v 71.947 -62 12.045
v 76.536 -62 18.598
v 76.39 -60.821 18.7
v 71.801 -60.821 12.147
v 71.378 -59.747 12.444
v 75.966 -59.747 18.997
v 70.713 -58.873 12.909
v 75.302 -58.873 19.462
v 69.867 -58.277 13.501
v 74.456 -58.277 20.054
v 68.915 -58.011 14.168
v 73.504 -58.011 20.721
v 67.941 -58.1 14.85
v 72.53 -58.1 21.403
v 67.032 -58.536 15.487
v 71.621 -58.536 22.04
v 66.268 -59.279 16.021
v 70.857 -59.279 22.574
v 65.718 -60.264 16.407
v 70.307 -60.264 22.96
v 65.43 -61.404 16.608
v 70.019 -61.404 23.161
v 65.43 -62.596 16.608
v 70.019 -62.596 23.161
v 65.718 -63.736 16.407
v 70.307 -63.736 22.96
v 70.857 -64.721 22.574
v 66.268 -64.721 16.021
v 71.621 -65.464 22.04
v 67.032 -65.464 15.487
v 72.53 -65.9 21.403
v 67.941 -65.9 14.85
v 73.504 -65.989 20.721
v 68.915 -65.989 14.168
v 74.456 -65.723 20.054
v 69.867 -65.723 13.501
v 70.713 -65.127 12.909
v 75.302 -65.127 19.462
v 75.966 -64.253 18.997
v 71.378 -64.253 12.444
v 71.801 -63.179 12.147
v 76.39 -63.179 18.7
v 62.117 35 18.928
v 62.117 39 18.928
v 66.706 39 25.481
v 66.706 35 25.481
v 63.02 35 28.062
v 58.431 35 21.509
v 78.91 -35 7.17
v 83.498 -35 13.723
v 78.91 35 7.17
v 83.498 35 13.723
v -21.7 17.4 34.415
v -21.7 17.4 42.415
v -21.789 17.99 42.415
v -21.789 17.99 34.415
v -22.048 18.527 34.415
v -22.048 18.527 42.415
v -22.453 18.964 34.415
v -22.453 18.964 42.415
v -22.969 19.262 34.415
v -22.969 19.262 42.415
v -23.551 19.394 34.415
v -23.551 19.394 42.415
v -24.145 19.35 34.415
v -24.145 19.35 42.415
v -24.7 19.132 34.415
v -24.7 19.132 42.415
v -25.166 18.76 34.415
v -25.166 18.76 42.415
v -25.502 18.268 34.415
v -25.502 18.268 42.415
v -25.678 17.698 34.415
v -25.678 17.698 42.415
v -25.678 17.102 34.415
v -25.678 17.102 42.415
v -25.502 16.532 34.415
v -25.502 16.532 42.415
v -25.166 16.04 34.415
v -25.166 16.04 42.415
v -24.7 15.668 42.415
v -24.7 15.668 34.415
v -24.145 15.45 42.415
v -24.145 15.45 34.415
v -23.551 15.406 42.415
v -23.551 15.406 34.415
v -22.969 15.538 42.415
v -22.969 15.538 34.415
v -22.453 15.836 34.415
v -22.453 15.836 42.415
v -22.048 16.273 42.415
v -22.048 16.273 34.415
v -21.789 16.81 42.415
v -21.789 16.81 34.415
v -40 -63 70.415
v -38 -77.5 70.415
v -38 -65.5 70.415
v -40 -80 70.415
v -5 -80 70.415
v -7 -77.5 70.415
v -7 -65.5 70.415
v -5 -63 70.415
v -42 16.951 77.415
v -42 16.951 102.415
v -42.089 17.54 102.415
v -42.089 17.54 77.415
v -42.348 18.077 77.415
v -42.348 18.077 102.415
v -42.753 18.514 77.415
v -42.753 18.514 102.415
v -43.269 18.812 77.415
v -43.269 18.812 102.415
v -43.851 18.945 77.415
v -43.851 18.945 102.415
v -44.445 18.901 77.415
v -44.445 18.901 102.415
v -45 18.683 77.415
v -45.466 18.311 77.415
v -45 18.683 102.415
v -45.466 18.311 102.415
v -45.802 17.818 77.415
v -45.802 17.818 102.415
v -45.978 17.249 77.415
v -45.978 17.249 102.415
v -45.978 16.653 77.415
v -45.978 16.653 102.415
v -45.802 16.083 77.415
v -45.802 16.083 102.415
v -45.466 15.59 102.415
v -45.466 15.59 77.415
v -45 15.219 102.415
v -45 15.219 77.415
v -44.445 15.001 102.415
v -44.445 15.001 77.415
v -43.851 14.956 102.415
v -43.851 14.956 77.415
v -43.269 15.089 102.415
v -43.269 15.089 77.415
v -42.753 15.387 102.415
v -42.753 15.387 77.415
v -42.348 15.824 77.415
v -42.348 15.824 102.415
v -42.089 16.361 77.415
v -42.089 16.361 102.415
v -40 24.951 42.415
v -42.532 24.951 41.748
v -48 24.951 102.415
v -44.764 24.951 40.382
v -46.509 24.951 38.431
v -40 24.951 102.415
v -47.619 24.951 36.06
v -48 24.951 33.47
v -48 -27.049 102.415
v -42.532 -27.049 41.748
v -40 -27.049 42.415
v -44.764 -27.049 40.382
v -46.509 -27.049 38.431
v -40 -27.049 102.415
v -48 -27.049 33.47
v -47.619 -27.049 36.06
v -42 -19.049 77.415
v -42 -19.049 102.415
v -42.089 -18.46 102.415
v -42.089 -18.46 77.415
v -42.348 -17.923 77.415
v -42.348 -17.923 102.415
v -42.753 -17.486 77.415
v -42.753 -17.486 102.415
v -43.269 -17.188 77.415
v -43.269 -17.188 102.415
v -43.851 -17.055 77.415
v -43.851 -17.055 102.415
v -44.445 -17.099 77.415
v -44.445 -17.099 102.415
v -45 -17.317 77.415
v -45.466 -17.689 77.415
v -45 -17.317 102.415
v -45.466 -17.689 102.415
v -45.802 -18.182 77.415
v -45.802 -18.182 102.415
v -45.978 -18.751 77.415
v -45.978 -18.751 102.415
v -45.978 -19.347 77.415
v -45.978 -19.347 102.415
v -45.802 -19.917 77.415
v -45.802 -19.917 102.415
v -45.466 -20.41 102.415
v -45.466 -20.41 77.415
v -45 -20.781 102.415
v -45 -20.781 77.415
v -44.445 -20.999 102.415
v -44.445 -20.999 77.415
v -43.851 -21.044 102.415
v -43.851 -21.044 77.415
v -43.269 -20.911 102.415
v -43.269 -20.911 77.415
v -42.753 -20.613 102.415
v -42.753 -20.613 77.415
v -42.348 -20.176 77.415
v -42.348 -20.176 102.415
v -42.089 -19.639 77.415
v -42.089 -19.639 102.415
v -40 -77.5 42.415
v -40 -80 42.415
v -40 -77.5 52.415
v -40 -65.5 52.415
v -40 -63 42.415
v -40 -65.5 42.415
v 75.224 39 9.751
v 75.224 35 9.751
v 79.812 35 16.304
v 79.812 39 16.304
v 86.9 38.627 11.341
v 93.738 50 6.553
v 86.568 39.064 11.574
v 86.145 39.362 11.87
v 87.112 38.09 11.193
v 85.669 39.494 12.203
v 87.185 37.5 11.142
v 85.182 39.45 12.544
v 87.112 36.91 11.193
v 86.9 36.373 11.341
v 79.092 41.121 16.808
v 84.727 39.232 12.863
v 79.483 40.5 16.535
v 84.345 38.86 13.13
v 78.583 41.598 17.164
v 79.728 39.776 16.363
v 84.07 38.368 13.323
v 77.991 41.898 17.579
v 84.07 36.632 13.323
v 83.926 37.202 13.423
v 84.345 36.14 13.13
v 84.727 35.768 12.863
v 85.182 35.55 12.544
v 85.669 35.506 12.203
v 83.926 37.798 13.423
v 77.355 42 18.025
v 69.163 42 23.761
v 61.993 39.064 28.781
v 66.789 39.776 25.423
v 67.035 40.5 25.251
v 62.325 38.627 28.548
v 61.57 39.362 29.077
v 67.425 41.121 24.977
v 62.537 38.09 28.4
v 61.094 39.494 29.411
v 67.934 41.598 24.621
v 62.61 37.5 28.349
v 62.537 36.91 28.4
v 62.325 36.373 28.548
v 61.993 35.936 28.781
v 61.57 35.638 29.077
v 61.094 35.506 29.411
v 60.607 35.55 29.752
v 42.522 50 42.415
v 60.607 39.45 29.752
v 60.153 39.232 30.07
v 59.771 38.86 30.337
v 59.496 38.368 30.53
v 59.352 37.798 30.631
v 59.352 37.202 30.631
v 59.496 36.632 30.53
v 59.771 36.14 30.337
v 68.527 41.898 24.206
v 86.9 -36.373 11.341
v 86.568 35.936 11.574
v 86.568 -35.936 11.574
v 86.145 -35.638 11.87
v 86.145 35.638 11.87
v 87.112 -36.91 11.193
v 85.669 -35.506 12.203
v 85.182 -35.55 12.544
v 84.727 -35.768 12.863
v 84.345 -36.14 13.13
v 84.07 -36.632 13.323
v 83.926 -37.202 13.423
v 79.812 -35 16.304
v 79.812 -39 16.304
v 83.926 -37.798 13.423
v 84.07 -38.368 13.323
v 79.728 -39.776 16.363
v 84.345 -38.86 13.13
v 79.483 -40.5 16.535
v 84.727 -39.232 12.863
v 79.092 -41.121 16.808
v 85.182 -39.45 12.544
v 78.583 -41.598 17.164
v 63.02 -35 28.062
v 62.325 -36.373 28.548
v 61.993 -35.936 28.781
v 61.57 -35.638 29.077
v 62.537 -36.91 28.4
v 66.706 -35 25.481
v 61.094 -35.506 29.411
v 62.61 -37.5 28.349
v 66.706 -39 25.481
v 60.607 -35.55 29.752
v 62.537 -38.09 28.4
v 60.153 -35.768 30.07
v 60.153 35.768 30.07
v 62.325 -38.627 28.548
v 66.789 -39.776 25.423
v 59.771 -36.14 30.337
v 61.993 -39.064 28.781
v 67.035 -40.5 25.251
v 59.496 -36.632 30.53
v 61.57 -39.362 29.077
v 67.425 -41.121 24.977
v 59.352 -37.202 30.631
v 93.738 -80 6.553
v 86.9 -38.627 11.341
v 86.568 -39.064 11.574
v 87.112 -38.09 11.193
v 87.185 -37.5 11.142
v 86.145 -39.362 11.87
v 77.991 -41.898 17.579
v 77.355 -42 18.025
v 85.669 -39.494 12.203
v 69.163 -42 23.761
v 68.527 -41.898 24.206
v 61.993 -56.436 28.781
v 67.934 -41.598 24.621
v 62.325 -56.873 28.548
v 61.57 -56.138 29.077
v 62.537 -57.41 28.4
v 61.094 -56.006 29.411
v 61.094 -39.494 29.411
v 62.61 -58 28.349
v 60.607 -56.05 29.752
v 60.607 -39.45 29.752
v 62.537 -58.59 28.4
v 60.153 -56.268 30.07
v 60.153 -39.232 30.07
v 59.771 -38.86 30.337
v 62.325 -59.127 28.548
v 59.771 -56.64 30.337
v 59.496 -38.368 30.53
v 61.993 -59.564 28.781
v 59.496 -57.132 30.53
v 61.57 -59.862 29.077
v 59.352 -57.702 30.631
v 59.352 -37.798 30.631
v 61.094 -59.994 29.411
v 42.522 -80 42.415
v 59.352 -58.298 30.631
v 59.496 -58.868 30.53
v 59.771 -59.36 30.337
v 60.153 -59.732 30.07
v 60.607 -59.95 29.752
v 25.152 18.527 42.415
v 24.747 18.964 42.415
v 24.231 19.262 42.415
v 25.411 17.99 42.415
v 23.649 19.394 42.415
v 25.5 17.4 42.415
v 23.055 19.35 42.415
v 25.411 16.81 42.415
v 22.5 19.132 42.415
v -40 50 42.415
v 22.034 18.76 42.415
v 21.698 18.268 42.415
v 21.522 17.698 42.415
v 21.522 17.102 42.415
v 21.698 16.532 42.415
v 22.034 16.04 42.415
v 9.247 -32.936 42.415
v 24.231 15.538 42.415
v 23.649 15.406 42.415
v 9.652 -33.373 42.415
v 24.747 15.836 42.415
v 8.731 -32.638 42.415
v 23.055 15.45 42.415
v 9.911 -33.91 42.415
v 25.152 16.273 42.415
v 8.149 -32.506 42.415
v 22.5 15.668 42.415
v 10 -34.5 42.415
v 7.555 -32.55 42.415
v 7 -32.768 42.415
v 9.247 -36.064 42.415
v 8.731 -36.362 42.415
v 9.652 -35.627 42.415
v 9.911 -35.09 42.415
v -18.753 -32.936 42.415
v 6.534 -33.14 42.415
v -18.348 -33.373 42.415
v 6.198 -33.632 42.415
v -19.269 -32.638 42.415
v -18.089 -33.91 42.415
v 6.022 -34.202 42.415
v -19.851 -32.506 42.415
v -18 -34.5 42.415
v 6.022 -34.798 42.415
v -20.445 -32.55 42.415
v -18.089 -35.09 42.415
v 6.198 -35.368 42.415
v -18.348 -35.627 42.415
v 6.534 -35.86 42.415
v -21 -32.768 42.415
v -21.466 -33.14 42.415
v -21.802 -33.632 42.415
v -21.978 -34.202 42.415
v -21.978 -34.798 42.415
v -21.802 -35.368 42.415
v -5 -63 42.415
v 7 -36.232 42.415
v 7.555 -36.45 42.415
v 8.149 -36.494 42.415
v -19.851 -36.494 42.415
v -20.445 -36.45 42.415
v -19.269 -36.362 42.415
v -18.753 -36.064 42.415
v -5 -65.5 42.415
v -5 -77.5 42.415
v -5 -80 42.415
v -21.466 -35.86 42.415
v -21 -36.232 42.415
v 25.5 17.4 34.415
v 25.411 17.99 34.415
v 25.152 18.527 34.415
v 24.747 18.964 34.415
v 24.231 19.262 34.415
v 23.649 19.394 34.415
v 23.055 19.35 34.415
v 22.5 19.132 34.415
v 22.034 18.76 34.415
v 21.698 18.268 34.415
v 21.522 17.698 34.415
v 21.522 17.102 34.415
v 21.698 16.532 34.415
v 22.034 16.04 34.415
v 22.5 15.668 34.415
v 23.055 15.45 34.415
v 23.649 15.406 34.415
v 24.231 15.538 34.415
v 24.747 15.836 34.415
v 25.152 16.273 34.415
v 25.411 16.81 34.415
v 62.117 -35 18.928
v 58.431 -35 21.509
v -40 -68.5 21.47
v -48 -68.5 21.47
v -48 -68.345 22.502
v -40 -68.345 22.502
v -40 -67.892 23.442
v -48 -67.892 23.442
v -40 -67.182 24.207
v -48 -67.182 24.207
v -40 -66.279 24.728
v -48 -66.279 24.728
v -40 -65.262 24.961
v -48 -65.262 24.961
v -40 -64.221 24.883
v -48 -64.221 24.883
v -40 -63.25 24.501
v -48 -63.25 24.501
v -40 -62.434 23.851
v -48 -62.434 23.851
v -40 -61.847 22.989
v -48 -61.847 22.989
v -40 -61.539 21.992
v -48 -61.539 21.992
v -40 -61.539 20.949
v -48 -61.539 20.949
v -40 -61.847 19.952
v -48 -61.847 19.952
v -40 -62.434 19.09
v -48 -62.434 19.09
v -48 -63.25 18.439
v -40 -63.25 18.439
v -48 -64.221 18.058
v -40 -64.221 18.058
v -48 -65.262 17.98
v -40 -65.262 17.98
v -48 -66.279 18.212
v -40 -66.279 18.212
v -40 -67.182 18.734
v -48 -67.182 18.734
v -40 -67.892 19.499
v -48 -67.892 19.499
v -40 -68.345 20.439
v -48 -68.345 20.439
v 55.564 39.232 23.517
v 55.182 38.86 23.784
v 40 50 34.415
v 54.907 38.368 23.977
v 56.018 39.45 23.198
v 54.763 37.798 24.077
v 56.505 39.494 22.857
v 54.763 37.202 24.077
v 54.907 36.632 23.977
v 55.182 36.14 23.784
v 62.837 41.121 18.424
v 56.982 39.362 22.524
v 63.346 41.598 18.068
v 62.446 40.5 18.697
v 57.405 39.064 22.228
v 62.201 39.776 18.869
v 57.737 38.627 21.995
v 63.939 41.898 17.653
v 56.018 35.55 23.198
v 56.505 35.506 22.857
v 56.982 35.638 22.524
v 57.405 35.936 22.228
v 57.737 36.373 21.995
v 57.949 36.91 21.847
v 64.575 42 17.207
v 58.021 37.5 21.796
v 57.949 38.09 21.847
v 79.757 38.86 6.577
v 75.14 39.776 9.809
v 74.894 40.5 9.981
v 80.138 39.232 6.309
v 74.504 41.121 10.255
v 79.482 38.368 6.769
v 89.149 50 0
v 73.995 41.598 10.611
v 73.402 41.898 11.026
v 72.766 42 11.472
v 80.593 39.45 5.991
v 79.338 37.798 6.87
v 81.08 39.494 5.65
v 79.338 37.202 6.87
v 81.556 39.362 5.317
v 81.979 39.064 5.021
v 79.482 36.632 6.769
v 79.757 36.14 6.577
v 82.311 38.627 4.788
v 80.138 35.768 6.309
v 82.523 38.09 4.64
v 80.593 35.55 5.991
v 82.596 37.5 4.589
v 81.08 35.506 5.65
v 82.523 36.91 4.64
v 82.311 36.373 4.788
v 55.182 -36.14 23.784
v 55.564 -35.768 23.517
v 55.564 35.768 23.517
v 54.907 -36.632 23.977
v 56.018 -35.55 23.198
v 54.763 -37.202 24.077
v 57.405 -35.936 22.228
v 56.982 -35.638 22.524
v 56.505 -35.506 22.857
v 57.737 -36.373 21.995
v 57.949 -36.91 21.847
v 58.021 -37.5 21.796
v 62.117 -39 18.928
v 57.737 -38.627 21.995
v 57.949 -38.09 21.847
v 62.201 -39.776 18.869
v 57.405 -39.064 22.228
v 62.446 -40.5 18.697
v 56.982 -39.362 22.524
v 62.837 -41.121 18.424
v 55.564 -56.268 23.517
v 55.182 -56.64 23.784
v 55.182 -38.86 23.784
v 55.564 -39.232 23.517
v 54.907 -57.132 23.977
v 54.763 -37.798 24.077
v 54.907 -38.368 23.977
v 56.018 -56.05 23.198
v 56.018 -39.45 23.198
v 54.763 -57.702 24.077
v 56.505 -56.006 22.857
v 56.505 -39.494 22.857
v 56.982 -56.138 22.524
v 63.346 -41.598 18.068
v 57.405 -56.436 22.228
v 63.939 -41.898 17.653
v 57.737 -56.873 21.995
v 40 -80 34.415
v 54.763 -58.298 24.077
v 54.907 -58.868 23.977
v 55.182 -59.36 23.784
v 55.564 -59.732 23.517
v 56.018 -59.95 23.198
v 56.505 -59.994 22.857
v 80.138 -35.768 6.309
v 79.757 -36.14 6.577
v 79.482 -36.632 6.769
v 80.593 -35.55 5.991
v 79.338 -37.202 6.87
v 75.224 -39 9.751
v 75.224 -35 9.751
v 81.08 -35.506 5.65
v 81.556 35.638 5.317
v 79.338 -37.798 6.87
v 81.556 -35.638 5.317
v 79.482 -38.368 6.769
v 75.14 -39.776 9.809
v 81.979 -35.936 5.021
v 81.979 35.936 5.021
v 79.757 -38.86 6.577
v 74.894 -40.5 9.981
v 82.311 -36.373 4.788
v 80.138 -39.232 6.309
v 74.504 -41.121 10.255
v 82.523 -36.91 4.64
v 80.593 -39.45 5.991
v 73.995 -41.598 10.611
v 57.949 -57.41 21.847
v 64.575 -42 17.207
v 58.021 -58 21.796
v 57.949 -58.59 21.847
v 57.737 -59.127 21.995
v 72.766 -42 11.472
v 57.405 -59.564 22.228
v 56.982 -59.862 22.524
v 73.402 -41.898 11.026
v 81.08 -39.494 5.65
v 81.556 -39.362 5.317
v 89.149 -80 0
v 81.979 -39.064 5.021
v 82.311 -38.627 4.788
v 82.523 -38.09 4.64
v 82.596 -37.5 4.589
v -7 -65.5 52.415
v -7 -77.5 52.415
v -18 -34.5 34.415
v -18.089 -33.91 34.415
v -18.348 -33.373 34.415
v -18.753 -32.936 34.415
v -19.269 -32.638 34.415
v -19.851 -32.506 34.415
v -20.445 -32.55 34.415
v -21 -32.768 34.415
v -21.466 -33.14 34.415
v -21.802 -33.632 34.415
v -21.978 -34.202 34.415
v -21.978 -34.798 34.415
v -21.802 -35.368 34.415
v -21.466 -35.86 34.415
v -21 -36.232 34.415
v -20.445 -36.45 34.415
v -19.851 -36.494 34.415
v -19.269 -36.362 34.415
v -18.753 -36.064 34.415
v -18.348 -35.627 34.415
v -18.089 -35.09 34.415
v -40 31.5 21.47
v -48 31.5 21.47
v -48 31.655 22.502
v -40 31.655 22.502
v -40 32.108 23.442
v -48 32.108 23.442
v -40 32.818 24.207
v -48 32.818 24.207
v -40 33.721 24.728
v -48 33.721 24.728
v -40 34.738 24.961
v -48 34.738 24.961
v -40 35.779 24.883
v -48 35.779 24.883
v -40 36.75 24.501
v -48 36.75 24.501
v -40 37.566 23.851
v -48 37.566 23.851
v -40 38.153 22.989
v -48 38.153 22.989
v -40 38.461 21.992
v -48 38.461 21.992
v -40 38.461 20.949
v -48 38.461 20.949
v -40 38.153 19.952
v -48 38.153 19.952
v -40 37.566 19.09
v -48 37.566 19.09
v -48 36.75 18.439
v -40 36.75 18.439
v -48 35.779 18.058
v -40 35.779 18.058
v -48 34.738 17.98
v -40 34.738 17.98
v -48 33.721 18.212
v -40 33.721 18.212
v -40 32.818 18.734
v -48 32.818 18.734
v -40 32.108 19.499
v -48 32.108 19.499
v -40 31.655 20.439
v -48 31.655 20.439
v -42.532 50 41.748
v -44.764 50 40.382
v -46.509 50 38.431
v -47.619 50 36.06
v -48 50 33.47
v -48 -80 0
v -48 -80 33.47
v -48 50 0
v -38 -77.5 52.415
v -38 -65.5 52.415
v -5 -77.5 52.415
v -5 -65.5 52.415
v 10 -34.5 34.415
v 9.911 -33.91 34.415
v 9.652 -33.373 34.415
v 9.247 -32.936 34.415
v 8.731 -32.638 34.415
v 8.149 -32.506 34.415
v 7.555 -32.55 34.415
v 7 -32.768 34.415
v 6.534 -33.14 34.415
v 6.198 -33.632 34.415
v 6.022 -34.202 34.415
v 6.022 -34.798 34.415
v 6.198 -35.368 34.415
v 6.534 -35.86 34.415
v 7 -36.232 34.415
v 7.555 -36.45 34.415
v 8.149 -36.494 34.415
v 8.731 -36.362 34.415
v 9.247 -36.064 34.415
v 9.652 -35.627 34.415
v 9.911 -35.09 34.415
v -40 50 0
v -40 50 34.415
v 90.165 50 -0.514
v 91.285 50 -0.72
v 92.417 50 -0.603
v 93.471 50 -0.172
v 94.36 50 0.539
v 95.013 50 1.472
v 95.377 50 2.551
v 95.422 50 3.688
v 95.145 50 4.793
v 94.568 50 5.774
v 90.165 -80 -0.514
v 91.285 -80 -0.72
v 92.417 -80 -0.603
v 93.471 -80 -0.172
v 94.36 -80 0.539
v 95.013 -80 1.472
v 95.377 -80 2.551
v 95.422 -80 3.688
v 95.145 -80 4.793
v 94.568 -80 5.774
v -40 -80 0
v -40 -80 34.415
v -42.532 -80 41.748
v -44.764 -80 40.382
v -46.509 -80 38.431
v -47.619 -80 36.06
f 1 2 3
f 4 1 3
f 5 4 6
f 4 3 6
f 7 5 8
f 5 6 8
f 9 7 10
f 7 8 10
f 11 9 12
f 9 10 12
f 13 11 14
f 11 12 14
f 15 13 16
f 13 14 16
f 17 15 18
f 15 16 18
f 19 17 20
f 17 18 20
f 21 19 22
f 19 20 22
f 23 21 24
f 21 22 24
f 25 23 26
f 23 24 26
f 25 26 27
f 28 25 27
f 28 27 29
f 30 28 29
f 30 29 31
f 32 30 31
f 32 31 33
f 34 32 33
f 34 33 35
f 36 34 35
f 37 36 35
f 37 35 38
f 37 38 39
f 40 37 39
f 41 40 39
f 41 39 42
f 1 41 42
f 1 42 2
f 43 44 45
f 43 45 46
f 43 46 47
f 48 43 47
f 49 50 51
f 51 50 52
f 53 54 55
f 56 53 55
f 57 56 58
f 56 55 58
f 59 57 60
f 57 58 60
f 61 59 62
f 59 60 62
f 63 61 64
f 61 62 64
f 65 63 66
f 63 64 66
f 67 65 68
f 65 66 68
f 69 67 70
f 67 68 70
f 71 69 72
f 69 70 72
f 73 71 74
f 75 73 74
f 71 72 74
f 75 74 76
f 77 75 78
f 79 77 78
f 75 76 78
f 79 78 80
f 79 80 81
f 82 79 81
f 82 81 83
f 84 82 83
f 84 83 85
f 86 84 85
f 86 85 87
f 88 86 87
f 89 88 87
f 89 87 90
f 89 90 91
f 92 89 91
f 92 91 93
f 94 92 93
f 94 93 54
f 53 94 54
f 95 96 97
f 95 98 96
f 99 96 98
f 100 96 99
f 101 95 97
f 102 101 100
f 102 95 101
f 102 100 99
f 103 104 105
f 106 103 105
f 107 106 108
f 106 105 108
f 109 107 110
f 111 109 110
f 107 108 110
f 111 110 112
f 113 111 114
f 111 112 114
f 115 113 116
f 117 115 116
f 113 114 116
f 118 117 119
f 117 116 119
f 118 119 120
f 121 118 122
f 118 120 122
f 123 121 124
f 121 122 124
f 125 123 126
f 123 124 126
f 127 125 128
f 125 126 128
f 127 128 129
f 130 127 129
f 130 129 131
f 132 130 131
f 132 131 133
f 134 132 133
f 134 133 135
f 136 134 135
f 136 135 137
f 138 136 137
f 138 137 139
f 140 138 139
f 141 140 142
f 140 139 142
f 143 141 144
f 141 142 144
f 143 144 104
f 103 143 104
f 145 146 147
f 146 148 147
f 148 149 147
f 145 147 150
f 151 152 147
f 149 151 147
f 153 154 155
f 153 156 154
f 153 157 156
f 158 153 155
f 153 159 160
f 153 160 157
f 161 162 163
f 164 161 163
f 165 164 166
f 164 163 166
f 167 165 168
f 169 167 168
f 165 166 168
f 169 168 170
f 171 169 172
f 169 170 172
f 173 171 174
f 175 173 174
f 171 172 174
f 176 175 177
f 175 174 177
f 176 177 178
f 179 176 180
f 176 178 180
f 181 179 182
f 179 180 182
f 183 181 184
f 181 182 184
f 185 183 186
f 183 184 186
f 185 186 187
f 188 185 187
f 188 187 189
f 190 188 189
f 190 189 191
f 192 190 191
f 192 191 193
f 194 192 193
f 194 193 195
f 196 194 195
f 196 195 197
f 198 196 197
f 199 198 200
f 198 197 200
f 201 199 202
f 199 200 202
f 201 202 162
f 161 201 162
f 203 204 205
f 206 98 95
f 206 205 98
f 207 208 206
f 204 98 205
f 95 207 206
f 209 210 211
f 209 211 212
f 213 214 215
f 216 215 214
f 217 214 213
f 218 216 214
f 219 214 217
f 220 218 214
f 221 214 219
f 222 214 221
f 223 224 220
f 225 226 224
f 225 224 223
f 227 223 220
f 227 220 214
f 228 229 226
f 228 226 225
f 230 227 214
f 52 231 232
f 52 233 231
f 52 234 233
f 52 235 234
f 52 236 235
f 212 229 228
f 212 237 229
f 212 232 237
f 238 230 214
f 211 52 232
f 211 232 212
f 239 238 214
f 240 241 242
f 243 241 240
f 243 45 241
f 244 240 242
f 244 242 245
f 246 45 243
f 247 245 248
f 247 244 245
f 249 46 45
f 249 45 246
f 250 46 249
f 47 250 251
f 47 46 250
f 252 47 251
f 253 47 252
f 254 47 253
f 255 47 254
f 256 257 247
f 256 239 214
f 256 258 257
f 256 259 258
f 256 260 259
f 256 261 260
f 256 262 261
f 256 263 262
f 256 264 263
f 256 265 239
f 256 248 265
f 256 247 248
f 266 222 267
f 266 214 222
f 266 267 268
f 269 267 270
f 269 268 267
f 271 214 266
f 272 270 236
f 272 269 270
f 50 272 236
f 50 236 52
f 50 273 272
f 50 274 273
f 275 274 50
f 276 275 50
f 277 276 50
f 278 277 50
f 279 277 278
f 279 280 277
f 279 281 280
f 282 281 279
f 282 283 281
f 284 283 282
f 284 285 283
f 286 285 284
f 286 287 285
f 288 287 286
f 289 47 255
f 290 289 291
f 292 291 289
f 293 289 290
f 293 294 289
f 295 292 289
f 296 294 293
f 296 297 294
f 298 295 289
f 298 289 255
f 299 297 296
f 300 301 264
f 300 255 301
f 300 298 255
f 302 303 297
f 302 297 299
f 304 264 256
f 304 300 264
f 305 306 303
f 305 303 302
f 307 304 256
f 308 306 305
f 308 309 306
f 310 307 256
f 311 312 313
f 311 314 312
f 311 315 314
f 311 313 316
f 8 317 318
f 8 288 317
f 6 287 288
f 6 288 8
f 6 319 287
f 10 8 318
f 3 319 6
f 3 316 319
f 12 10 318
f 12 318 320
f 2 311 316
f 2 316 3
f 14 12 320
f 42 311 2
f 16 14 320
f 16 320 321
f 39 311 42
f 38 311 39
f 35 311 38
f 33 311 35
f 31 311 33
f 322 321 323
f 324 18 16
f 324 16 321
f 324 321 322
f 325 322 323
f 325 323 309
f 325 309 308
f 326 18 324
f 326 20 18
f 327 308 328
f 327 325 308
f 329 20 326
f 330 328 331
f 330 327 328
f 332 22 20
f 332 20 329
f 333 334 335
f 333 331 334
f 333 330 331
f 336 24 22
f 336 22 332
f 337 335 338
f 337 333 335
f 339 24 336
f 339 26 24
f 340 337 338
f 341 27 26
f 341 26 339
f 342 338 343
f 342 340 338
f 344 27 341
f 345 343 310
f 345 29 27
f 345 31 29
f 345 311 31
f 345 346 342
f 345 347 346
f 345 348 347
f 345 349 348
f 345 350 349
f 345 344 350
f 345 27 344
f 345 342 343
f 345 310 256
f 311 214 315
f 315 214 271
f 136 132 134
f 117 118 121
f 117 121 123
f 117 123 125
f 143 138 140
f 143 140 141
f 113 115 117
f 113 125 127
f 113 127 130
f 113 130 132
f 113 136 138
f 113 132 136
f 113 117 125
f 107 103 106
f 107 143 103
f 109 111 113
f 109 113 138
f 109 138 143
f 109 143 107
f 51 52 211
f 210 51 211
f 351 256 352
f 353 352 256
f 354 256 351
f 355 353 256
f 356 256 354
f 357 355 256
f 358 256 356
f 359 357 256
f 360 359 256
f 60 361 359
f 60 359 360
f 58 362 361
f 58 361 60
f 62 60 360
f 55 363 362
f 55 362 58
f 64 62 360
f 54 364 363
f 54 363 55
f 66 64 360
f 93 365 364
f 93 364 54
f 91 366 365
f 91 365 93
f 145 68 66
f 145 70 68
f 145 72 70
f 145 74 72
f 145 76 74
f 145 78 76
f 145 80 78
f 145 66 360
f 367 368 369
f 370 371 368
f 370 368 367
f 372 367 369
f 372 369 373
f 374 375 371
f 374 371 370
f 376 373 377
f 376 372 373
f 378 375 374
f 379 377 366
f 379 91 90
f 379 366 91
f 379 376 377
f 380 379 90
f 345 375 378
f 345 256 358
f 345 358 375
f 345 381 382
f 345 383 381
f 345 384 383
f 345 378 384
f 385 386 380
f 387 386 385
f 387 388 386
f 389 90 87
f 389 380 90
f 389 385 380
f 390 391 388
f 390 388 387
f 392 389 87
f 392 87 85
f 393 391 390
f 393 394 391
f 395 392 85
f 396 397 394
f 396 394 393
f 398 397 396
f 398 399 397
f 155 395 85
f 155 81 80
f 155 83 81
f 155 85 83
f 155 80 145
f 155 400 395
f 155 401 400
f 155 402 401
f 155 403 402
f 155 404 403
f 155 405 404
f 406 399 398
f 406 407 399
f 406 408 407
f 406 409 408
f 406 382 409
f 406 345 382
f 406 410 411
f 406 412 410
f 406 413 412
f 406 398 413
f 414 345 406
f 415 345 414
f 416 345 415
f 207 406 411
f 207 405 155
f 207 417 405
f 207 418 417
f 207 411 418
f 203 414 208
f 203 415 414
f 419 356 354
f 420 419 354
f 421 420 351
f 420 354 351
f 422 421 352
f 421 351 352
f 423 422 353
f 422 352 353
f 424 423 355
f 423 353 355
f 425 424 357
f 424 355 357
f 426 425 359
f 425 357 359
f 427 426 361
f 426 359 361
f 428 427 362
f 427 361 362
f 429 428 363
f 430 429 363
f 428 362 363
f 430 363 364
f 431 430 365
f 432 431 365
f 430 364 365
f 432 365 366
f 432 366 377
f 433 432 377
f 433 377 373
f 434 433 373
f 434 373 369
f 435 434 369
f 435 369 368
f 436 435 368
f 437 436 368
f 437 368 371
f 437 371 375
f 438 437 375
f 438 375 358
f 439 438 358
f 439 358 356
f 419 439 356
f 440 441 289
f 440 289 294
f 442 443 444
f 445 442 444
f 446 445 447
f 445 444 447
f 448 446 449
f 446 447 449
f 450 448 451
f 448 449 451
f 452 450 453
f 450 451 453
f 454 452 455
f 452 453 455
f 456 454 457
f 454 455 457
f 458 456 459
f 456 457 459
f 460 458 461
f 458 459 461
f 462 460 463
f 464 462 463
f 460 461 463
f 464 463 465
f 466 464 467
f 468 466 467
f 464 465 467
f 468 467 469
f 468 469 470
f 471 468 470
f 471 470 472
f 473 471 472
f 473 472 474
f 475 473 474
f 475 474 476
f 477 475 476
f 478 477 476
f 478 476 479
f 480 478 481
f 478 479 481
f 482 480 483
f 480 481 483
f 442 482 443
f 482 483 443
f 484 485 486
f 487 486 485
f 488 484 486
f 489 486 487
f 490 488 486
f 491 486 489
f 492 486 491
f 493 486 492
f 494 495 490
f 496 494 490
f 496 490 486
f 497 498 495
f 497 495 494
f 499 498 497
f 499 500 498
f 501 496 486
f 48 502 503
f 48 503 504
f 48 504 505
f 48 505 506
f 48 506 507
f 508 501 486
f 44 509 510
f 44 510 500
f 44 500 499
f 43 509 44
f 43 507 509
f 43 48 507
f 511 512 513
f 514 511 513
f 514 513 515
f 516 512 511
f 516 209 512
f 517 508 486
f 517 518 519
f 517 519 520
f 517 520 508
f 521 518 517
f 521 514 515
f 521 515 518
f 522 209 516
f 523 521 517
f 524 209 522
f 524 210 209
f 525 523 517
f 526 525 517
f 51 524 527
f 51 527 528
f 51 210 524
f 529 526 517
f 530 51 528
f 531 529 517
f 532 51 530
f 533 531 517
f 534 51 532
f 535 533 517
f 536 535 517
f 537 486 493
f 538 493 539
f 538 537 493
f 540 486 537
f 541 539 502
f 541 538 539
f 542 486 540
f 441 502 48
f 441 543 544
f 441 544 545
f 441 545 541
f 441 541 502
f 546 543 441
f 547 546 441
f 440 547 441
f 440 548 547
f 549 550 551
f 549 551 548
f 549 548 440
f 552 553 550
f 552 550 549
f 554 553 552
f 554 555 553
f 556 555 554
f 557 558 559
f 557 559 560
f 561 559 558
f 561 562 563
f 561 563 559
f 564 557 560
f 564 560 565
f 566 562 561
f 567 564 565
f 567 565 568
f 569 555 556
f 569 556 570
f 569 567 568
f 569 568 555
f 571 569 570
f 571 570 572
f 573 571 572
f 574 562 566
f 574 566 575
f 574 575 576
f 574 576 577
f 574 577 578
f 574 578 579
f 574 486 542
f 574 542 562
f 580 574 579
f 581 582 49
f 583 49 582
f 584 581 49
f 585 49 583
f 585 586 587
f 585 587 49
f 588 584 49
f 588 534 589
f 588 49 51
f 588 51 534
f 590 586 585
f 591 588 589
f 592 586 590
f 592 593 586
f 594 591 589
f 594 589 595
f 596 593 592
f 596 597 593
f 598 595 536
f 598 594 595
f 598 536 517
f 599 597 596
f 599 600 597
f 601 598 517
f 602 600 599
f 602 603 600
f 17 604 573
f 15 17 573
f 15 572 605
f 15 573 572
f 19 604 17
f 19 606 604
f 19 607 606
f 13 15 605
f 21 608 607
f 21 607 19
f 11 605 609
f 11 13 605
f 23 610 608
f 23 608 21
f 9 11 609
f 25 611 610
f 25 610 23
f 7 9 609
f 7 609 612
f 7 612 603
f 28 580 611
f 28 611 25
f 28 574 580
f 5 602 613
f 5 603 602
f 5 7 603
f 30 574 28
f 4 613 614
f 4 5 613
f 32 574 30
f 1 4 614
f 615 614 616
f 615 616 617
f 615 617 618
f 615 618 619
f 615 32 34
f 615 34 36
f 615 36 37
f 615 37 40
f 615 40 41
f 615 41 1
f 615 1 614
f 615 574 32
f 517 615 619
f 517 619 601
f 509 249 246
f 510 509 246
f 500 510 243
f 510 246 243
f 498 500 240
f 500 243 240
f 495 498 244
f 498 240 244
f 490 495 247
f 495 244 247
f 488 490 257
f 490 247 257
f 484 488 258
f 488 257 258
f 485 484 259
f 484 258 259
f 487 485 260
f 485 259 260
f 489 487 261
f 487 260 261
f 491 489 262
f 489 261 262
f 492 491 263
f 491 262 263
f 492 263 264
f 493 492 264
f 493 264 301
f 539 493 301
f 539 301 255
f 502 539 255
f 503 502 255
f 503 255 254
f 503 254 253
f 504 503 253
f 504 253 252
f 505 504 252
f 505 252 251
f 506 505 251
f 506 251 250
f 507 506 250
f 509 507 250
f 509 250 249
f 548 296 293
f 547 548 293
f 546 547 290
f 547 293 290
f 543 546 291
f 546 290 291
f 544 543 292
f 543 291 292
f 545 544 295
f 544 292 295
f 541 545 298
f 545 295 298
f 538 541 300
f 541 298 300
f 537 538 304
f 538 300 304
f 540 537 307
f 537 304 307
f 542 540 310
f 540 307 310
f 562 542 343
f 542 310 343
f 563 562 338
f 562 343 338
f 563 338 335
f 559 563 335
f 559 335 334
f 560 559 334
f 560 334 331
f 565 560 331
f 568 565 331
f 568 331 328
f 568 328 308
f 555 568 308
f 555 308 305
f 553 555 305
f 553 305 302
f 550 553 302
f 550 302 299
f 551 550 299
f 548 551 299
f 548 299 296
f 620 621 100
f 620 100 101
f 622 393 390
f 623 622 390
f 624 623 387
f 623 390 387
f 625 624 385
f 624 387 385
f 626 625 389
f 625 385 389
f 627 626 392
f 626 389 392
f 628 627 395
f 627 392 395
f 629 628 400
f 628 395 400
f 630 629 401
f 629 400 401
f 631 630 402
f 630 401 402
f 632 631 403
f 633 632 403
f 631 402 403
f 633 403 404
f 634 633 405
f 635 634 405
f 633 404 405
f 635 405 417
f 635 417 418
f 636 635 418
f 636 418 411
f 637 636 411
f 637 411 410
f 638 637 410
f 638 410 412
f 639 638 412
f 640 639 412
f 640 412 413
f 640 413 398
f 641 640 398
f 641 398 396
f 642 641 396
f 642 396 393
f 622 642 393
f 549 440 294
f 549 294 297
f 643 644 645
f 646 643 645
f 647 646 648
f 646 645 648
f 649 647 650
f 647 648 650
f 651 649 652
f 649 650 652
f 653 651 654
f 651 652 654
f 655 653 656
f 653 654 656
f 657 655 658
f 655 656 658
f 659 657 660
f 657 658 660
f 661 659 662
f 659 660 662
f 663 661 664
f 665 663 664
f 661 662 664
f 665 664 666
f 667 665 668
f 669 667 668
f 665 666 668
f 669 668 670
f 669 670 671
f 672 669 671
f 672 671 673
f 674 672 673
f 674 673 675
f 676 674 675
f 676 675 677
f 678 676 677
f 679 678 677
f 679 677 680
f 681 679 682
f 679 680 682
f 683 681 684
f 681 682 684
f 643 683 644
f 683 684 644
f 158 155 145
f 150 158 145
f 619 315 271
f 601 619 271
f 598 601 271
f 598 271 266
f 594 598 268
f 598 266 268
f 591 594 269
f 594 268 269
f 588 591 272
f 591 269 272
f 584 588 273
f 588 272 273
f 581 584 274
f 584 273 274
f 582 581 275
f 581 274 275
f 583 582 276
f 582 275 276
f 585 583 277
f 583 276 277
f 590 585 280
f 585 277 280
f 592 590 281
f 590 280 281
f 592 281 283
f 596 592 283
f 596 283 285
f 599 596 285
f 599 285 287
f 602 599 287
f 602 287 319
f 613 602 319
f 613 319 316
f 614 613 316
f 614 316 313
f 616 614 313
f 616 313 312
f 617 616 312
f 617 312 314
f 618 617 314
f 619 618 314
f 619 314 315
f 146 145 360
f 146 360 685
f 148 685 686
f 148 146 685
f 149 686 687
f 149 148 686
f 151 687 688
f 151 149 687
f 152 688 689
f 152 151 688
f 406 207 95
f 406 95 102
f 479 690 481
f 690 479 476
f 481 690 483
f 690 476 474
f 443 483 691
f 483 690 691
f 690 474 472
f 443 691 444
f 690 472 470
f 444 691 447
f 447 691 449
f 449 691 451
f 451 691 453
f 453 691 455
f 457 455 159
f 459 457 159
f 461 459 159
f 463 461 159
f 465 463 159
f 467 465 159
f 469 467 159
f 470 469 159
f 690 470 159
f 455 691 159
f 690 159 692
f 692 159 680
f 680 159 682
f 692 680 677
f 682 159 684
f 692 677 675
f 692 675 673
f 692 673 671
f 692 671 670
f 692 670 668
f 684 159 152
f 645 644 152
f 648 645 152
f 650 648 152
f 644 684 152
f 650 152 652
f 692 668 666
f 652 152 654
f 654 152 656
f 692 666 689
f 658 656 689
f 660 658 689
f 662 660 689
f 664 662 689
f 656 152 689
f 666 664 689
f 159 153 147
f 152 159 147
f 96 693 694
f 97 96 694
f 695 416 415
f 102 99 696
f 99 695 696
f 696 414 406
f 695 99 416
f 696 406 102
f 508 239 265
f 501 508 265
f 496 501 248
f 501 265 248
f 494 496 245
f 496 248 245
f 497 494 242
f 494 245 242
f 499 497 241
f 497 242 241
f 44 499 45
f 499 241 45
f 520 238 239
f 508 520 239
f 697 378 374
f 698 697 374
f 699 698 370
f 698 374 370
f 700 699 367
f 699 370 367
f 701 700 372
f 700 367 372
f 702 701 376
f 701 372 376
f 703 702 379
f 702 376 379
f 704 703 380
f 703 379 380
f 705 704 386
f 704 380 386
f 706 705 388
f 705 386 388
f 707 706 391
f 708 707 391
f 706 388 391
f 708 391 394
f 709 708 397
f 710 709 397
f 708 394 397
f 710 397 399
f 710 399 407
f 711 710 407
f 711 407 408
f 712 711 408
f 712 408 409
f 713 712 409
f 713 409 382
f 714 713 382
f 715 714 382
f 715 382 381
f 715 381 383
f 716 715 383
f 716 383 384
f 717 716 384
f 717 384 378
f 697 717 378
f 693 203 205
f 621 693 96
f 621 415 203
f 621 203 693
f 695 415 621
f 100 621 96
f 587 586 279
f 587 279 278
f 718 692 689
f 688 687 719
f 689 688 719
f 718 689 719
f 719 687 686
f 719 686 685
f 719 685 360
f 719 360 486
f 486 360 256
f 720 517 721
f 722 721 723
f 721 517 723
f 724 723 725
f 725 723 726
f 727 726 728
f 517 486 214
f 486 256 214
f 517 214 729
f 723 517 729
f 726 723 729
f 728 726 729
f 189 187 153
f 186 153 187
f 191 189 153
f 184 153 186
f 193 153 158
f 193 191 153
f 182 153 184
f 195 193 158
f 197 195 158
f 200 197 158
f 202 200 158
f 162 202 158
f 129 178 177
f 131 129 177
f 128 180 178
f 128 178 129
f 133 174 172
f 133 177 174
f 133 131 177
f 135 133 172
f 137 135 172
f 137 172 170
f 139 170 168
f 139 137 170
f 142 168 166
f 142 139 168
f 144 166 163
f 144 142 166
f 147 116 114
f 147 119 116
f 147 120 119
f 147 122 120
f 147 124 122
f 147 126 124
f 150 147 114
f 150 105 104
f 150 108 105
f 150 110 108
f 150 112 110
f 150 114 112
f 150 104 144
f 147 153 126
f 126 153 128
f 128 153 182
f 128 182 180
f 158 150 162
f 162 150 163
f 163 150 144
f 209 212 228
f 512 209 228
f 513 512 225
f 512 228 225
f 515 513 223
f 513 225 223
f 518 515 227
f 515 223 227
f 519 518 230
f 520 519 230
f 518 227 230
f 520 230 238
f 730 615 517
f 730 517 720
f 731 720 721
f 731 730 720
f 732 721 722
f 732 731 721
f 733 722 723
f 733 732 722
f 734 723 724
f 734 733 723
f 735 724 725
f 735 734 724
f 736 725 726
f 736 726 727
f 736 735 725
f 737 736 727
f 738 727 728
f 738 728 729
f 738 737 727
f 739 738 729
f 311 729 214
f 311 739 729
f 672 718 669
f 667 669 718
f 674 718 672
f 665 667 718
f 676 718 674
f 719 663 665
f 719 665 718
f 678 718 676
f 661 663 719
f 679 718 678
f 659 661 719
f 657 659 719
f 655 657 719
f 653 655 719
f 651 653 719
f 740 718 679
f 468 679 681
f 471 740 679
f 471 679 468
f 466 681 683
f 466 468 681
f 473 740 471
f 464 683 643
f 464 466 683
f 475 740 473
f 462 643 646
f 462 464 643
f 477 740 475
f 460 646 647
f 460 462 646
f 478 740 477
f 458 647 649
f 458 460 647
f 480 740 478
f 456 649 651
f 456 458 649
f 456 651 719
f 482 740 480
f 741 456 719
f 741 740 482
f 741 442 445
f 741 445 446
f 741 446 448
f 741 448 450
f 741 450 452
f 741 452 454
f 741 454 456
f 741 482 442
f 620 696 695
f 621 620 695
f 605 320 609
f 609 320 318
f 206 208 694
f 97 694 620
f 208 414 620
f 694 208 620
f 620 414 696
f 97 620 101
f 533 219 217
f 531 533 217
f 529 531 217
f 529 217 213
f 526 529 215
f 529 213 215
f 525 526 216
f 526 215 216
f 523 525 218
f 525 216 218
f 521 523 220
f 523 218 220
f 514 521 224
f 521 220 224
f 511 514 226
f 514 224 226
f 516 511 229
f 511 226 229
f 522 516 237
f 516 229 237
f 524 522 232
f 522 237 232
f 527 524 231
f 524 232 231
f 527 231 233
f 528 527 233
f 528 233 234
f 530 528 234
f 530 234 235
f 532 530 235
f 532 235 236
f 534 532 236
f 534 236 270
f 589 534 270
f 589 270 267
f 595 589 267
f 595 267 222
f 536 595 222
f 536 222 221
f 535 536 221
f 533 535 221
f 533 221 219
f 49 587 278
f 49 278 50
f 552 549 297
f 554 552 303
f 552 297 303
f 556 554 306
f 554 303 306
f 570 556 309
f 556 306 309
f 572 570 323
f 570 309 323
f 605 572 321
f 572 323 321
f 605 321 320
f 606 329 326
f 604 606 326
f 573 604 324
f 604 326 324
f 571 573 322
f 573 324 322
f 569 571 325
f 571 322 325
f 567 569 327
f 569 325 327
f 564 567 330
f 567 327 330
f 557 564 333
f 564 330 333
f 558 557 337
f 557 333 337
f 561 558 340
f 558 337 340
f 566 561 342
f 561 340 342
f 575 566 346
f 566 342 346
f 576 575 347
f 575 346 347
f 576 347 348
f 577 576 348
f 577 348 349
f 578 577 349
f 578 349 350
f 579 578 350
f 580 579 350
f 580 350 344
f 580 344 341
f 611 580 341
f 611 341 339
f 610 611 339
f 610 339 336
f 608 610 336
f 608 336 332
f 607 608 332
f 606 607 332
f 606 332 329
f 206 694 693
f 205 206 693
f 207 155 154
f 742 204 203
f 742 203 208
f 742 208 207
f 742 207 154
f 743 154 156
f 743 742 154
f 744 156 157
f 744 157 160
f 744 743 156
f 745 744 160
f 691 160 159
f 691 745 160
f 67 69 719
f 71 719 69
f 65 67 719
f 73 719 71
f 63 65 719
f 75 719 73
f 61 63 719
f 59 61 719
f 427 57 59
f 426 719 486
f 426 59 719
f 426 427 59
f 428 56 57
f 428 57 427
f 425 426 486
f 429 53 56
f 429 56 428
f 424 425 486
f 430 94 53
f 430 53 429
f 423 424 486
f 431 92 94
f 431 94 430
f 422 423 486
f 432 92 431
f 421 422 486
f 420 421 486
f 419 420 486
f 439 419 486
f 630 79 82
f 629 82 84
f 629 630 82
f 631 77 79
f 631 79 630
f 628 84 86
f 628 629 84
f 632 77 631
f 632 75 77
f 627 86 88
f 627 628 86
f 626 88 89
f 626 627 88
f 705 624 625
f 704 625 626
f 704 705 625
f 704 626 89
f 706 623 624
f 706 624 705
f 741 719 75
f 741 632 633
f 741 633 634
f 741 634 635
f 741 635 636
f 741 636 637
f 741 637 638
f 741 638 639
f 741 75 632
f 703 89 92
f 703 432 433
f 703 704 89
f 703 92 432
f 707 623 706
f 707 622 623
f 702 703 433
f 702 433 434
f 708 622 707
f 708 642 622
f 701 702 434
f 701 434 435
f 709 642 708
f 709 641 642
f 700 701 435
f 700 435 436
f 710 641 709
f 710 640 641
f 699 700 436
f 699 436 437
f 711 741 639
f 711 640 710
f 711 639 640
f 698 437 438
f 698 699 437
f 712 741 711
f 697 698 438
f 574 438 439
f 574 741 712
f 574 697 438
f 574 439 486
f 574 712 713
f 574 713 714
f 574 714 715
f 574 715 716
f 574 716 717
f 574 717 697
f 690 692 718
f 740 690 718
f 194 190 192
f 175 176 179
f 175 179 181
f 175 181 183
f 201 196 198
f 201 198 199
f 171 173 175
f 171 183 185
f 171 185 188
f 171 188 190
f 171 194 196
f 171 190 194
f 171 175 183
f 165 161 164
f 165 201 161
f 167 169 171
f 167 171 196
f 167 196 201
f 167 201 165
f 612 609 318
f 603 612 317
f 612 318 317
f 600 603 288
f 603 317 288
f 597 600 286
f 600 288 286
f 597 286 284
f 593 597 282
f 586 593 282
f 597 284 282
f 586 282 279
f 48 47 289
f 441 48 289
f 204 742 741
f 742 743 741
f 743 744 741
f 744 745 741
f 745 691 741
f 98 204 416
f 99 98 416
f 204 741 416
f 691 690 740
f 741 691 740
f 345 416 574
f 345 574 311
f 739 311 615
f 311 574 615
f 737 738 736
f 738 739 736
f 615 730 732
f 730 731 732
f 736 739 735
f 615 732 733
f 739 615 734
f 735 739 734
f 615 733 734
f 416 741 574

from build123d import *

# Parameters (mm, degrees)
F1_DEPTH       = 80
F1_DEPTH_BACK  = 50
F2_R           = 2
F3_DEPTH       = 25
F4_R           = 2
F5_DEPTH       = 25
F6_W           = 35
F6_H           = 17
F6_W_2         = 31
F6_H_2         = 12
F7_DEPTH       = 28
F8_W           = 6
F8_H           = 10
F9_DEPTH       = 43.001
F10_R          = 4
F10_R_2        = 2
F11_DEPTH      = 25
F12_R          = 3.5
F13_DEPTH      = 8
F14_W          = 8
F14_H          = 52
F15_DEPTH      = 60
F15_DEPTH_BACK = 25
F16_R          = 2
F17_DEPTH      = 25


with BuildPart() as f1:
    # F0 (on Front) → F1 (new body, two sides)
    with BuildSketch(Plane.XZ) as f1_sk:
        with BuildLine():
            Line((40, 34.4145861811), (89.1491226573, 0))
            ThreePointArc((89.1491226573, 0), (94.7200365799, 0.9823024318), (93.7377341481, 6.5532163543))
            Line((93.7377341481, 6.5532163543), (42.522390311, 42.4145861811))
            Line((42.522390311, 42.4145861811), (-40, 42.4145861811))
            ThreePointArc((-40, 42.4145861811), (-45.7082039325, 39.4703142711), (-48, 33.4703142711))
            Line((-48, 33.4703142711), (-48, 0))
            Line((-48, 0), (-40, 0))
            Line((-40, 0), (-40, 34.4145861811))
            Line((-40, 34.4145861811), (40, 34.4145861811))
        make_face()
    extrude(amount=F1_DEPTH)
    extrude(f1_sk.sketch, amount=-F1_DEPTH_BACK)

    # F2 (on face) → F3 (cut)
    with BuildSketch(Plane(origin=(33.9177749652, 0, 48.4396027096), x_dir=(0.8191520443, 0, -0.5735764364), z_dir=(0.5735764364, 0, 0.8191520443))):
        with BuildLine():
            Line((35.5266860713, 35), (35.5266860713, -35))
            Line((35.5266860713, -35), (40.0266860713, -35))
            Line((40.0266860713, -35), (40.0266860713, -39))
            ThreePointArc((40.0266860713, -39), (40.9053657278, -41.1213203436), (43.0266860713, -42))
            Line((43.0266860713, -42), (53.0266860713, -42))
            ThreePointArc((53.0266860713, -42), (55.1480064149, -41.1213203436), (56.0266860713, -39))
            Line((56.0266860713, -39), (56.0266860713, -35))
            Line((56.0266860713, -35), (60.5266860713, -35))
            Line((60.5266860713, -35), (60.5266860713, 35))
            Line((60.5266860713, 35), (56.0266860713, 35))
            Line((56.0266860713, 35), (40.0266860713, 35))
            Line((40.0266860713, 35), (35.5266860713, 35))
        make_face()
        with BuildLine():
            Line((40.0266860713, 35.0351855159), (40.0266860713, 35))
            Line((40.0266860713, 35), (56.0266860713, 35))
            Line((56.0266860713, 35), (56.0266860713, 39))
            ThreePointArc((56.0266860713, 39), (55.1480064149, 41.1213203436), (53.0266860713, 42))
            Line((53.0266860713, 42), (43.0266860713, 42))
            ThreePointArc((43.0266860713, 42), (40.9053657278, 41.1213203436), (40.0266860713, 39))
            Line((40.0266860713, 39), (40.0266860713, 35.0351855159))
        make_face()
        with Locations((33.0266860713, -37.5)):
            Circle(F2_R)
        with Locations((33.0266860713, 37.5)):
            Circle(F2_R)
        with Locations((63.0266860713, 37.5)):
            Circle(F2_R)
        with Locations((63.0266860713, -37.5)):
            Circle(F2_R)
    extrude(amount=-F3_DEPTH, mode=Mode.SUBTRACT)

    # F4 (on face) → F5 (cut)
    with BuildSketch(Plane.XY.offset(42.4145861811)):
        with Locations((8, -34.4999909401)):
            Circle(F4_R)
        with Locations((-20, -34.4999909401)):
            Circle(F4_R)
        with Locations((23.5, 17.4000090599)):
            Circle(F4_R)
        with Locations((-23.7, 17.4000090599)):
            Circle(F4_R)
    extrude(amount=-F5_DEPTH, mode=Mode.SUBTRACT)

    # F6 (on face) → F7 (join)
    with BuildSketch(Plane.XY.offset(42.4145861811)):
        with Locations((-22.5, -71.5)):
            Rectangle(F6_W, F6_H)
        with Locations((-22.5, -71.5)):
            Rectangle(F6_W_2, F6_H_2, mode=Mode.SUBTRACT)
    extrude(amount=F7_DEPTH)

    # F8 (on face) → F9 (cut, through all)
    with BuildSketch(Plane.YZ.offset(-5)):
        with Locations((-74.5, 47.4145861811)):
            Rectangle(F8_W, F8_H)
        with Locations((-68.5, 47.4145861811)):
            Rectangle(F8_W, F8_H)
    extrude(amount=-F9_DEPTH, mode=Mode.SUBTRACT)

    # F10 (on face) → F11 (cut)
    with BuildSketch(Plane(origin=(33.9177749652, 0, 48.4396027096), x_dir=(0.8191520443, 0, -0.5735764364), z_dir=(0.5735764364, 0, 0.8191520443))):
        with Locations((48.0266860713, -62)):
            Circle(F10_R)
        with Locations((33.0266860713, -58)):
            Circle(F10_R_2)
    extrude(amount=-F11_DEPTH, mode=Mode.SUBTRACT)

    # F12 (on face) → F13 (cut, through all)
    with BuildSketch(Plane(origin=(-48, 0, 0), x_dir=(0, -1, 0), z_dir=(-1, 0, 0))):
        with Locations((-35, 21.4703142711)):
            Circle(F12_R)
        with Locations((65, 21.4703142711)):
            Circle(F12_R)
    extrude(amount=-F13_DEPTH, mode=Mode.SUBTRACT)

    # F14 (on face) → F15 (join, two sides)
    with BuildSketch(Plane.XY.offset(42.4145861811)) as f15_sk:
        with Locations((-44, -1.0492918789)):
            Rectangle(F14_W, F14_H)
    extrude(amount=F15_DEPTH)
    extrude(f15_sk.sketch, amount=-F15_DEPTH_BACK)

    # F16 (on face) → F17 (cut)
    with BuildSketch(Plane.XY.offset(102.4145861811)):
        with Locations((-44, -19.0492918789)):
            Circle(F16_R)
        with Locations((-44, 16.9507081211)):
            Circle(F16_R)
    extrude(amount=-F17_DEPTH, mode=Mode.SUBTRACT)


solid = f1.part
